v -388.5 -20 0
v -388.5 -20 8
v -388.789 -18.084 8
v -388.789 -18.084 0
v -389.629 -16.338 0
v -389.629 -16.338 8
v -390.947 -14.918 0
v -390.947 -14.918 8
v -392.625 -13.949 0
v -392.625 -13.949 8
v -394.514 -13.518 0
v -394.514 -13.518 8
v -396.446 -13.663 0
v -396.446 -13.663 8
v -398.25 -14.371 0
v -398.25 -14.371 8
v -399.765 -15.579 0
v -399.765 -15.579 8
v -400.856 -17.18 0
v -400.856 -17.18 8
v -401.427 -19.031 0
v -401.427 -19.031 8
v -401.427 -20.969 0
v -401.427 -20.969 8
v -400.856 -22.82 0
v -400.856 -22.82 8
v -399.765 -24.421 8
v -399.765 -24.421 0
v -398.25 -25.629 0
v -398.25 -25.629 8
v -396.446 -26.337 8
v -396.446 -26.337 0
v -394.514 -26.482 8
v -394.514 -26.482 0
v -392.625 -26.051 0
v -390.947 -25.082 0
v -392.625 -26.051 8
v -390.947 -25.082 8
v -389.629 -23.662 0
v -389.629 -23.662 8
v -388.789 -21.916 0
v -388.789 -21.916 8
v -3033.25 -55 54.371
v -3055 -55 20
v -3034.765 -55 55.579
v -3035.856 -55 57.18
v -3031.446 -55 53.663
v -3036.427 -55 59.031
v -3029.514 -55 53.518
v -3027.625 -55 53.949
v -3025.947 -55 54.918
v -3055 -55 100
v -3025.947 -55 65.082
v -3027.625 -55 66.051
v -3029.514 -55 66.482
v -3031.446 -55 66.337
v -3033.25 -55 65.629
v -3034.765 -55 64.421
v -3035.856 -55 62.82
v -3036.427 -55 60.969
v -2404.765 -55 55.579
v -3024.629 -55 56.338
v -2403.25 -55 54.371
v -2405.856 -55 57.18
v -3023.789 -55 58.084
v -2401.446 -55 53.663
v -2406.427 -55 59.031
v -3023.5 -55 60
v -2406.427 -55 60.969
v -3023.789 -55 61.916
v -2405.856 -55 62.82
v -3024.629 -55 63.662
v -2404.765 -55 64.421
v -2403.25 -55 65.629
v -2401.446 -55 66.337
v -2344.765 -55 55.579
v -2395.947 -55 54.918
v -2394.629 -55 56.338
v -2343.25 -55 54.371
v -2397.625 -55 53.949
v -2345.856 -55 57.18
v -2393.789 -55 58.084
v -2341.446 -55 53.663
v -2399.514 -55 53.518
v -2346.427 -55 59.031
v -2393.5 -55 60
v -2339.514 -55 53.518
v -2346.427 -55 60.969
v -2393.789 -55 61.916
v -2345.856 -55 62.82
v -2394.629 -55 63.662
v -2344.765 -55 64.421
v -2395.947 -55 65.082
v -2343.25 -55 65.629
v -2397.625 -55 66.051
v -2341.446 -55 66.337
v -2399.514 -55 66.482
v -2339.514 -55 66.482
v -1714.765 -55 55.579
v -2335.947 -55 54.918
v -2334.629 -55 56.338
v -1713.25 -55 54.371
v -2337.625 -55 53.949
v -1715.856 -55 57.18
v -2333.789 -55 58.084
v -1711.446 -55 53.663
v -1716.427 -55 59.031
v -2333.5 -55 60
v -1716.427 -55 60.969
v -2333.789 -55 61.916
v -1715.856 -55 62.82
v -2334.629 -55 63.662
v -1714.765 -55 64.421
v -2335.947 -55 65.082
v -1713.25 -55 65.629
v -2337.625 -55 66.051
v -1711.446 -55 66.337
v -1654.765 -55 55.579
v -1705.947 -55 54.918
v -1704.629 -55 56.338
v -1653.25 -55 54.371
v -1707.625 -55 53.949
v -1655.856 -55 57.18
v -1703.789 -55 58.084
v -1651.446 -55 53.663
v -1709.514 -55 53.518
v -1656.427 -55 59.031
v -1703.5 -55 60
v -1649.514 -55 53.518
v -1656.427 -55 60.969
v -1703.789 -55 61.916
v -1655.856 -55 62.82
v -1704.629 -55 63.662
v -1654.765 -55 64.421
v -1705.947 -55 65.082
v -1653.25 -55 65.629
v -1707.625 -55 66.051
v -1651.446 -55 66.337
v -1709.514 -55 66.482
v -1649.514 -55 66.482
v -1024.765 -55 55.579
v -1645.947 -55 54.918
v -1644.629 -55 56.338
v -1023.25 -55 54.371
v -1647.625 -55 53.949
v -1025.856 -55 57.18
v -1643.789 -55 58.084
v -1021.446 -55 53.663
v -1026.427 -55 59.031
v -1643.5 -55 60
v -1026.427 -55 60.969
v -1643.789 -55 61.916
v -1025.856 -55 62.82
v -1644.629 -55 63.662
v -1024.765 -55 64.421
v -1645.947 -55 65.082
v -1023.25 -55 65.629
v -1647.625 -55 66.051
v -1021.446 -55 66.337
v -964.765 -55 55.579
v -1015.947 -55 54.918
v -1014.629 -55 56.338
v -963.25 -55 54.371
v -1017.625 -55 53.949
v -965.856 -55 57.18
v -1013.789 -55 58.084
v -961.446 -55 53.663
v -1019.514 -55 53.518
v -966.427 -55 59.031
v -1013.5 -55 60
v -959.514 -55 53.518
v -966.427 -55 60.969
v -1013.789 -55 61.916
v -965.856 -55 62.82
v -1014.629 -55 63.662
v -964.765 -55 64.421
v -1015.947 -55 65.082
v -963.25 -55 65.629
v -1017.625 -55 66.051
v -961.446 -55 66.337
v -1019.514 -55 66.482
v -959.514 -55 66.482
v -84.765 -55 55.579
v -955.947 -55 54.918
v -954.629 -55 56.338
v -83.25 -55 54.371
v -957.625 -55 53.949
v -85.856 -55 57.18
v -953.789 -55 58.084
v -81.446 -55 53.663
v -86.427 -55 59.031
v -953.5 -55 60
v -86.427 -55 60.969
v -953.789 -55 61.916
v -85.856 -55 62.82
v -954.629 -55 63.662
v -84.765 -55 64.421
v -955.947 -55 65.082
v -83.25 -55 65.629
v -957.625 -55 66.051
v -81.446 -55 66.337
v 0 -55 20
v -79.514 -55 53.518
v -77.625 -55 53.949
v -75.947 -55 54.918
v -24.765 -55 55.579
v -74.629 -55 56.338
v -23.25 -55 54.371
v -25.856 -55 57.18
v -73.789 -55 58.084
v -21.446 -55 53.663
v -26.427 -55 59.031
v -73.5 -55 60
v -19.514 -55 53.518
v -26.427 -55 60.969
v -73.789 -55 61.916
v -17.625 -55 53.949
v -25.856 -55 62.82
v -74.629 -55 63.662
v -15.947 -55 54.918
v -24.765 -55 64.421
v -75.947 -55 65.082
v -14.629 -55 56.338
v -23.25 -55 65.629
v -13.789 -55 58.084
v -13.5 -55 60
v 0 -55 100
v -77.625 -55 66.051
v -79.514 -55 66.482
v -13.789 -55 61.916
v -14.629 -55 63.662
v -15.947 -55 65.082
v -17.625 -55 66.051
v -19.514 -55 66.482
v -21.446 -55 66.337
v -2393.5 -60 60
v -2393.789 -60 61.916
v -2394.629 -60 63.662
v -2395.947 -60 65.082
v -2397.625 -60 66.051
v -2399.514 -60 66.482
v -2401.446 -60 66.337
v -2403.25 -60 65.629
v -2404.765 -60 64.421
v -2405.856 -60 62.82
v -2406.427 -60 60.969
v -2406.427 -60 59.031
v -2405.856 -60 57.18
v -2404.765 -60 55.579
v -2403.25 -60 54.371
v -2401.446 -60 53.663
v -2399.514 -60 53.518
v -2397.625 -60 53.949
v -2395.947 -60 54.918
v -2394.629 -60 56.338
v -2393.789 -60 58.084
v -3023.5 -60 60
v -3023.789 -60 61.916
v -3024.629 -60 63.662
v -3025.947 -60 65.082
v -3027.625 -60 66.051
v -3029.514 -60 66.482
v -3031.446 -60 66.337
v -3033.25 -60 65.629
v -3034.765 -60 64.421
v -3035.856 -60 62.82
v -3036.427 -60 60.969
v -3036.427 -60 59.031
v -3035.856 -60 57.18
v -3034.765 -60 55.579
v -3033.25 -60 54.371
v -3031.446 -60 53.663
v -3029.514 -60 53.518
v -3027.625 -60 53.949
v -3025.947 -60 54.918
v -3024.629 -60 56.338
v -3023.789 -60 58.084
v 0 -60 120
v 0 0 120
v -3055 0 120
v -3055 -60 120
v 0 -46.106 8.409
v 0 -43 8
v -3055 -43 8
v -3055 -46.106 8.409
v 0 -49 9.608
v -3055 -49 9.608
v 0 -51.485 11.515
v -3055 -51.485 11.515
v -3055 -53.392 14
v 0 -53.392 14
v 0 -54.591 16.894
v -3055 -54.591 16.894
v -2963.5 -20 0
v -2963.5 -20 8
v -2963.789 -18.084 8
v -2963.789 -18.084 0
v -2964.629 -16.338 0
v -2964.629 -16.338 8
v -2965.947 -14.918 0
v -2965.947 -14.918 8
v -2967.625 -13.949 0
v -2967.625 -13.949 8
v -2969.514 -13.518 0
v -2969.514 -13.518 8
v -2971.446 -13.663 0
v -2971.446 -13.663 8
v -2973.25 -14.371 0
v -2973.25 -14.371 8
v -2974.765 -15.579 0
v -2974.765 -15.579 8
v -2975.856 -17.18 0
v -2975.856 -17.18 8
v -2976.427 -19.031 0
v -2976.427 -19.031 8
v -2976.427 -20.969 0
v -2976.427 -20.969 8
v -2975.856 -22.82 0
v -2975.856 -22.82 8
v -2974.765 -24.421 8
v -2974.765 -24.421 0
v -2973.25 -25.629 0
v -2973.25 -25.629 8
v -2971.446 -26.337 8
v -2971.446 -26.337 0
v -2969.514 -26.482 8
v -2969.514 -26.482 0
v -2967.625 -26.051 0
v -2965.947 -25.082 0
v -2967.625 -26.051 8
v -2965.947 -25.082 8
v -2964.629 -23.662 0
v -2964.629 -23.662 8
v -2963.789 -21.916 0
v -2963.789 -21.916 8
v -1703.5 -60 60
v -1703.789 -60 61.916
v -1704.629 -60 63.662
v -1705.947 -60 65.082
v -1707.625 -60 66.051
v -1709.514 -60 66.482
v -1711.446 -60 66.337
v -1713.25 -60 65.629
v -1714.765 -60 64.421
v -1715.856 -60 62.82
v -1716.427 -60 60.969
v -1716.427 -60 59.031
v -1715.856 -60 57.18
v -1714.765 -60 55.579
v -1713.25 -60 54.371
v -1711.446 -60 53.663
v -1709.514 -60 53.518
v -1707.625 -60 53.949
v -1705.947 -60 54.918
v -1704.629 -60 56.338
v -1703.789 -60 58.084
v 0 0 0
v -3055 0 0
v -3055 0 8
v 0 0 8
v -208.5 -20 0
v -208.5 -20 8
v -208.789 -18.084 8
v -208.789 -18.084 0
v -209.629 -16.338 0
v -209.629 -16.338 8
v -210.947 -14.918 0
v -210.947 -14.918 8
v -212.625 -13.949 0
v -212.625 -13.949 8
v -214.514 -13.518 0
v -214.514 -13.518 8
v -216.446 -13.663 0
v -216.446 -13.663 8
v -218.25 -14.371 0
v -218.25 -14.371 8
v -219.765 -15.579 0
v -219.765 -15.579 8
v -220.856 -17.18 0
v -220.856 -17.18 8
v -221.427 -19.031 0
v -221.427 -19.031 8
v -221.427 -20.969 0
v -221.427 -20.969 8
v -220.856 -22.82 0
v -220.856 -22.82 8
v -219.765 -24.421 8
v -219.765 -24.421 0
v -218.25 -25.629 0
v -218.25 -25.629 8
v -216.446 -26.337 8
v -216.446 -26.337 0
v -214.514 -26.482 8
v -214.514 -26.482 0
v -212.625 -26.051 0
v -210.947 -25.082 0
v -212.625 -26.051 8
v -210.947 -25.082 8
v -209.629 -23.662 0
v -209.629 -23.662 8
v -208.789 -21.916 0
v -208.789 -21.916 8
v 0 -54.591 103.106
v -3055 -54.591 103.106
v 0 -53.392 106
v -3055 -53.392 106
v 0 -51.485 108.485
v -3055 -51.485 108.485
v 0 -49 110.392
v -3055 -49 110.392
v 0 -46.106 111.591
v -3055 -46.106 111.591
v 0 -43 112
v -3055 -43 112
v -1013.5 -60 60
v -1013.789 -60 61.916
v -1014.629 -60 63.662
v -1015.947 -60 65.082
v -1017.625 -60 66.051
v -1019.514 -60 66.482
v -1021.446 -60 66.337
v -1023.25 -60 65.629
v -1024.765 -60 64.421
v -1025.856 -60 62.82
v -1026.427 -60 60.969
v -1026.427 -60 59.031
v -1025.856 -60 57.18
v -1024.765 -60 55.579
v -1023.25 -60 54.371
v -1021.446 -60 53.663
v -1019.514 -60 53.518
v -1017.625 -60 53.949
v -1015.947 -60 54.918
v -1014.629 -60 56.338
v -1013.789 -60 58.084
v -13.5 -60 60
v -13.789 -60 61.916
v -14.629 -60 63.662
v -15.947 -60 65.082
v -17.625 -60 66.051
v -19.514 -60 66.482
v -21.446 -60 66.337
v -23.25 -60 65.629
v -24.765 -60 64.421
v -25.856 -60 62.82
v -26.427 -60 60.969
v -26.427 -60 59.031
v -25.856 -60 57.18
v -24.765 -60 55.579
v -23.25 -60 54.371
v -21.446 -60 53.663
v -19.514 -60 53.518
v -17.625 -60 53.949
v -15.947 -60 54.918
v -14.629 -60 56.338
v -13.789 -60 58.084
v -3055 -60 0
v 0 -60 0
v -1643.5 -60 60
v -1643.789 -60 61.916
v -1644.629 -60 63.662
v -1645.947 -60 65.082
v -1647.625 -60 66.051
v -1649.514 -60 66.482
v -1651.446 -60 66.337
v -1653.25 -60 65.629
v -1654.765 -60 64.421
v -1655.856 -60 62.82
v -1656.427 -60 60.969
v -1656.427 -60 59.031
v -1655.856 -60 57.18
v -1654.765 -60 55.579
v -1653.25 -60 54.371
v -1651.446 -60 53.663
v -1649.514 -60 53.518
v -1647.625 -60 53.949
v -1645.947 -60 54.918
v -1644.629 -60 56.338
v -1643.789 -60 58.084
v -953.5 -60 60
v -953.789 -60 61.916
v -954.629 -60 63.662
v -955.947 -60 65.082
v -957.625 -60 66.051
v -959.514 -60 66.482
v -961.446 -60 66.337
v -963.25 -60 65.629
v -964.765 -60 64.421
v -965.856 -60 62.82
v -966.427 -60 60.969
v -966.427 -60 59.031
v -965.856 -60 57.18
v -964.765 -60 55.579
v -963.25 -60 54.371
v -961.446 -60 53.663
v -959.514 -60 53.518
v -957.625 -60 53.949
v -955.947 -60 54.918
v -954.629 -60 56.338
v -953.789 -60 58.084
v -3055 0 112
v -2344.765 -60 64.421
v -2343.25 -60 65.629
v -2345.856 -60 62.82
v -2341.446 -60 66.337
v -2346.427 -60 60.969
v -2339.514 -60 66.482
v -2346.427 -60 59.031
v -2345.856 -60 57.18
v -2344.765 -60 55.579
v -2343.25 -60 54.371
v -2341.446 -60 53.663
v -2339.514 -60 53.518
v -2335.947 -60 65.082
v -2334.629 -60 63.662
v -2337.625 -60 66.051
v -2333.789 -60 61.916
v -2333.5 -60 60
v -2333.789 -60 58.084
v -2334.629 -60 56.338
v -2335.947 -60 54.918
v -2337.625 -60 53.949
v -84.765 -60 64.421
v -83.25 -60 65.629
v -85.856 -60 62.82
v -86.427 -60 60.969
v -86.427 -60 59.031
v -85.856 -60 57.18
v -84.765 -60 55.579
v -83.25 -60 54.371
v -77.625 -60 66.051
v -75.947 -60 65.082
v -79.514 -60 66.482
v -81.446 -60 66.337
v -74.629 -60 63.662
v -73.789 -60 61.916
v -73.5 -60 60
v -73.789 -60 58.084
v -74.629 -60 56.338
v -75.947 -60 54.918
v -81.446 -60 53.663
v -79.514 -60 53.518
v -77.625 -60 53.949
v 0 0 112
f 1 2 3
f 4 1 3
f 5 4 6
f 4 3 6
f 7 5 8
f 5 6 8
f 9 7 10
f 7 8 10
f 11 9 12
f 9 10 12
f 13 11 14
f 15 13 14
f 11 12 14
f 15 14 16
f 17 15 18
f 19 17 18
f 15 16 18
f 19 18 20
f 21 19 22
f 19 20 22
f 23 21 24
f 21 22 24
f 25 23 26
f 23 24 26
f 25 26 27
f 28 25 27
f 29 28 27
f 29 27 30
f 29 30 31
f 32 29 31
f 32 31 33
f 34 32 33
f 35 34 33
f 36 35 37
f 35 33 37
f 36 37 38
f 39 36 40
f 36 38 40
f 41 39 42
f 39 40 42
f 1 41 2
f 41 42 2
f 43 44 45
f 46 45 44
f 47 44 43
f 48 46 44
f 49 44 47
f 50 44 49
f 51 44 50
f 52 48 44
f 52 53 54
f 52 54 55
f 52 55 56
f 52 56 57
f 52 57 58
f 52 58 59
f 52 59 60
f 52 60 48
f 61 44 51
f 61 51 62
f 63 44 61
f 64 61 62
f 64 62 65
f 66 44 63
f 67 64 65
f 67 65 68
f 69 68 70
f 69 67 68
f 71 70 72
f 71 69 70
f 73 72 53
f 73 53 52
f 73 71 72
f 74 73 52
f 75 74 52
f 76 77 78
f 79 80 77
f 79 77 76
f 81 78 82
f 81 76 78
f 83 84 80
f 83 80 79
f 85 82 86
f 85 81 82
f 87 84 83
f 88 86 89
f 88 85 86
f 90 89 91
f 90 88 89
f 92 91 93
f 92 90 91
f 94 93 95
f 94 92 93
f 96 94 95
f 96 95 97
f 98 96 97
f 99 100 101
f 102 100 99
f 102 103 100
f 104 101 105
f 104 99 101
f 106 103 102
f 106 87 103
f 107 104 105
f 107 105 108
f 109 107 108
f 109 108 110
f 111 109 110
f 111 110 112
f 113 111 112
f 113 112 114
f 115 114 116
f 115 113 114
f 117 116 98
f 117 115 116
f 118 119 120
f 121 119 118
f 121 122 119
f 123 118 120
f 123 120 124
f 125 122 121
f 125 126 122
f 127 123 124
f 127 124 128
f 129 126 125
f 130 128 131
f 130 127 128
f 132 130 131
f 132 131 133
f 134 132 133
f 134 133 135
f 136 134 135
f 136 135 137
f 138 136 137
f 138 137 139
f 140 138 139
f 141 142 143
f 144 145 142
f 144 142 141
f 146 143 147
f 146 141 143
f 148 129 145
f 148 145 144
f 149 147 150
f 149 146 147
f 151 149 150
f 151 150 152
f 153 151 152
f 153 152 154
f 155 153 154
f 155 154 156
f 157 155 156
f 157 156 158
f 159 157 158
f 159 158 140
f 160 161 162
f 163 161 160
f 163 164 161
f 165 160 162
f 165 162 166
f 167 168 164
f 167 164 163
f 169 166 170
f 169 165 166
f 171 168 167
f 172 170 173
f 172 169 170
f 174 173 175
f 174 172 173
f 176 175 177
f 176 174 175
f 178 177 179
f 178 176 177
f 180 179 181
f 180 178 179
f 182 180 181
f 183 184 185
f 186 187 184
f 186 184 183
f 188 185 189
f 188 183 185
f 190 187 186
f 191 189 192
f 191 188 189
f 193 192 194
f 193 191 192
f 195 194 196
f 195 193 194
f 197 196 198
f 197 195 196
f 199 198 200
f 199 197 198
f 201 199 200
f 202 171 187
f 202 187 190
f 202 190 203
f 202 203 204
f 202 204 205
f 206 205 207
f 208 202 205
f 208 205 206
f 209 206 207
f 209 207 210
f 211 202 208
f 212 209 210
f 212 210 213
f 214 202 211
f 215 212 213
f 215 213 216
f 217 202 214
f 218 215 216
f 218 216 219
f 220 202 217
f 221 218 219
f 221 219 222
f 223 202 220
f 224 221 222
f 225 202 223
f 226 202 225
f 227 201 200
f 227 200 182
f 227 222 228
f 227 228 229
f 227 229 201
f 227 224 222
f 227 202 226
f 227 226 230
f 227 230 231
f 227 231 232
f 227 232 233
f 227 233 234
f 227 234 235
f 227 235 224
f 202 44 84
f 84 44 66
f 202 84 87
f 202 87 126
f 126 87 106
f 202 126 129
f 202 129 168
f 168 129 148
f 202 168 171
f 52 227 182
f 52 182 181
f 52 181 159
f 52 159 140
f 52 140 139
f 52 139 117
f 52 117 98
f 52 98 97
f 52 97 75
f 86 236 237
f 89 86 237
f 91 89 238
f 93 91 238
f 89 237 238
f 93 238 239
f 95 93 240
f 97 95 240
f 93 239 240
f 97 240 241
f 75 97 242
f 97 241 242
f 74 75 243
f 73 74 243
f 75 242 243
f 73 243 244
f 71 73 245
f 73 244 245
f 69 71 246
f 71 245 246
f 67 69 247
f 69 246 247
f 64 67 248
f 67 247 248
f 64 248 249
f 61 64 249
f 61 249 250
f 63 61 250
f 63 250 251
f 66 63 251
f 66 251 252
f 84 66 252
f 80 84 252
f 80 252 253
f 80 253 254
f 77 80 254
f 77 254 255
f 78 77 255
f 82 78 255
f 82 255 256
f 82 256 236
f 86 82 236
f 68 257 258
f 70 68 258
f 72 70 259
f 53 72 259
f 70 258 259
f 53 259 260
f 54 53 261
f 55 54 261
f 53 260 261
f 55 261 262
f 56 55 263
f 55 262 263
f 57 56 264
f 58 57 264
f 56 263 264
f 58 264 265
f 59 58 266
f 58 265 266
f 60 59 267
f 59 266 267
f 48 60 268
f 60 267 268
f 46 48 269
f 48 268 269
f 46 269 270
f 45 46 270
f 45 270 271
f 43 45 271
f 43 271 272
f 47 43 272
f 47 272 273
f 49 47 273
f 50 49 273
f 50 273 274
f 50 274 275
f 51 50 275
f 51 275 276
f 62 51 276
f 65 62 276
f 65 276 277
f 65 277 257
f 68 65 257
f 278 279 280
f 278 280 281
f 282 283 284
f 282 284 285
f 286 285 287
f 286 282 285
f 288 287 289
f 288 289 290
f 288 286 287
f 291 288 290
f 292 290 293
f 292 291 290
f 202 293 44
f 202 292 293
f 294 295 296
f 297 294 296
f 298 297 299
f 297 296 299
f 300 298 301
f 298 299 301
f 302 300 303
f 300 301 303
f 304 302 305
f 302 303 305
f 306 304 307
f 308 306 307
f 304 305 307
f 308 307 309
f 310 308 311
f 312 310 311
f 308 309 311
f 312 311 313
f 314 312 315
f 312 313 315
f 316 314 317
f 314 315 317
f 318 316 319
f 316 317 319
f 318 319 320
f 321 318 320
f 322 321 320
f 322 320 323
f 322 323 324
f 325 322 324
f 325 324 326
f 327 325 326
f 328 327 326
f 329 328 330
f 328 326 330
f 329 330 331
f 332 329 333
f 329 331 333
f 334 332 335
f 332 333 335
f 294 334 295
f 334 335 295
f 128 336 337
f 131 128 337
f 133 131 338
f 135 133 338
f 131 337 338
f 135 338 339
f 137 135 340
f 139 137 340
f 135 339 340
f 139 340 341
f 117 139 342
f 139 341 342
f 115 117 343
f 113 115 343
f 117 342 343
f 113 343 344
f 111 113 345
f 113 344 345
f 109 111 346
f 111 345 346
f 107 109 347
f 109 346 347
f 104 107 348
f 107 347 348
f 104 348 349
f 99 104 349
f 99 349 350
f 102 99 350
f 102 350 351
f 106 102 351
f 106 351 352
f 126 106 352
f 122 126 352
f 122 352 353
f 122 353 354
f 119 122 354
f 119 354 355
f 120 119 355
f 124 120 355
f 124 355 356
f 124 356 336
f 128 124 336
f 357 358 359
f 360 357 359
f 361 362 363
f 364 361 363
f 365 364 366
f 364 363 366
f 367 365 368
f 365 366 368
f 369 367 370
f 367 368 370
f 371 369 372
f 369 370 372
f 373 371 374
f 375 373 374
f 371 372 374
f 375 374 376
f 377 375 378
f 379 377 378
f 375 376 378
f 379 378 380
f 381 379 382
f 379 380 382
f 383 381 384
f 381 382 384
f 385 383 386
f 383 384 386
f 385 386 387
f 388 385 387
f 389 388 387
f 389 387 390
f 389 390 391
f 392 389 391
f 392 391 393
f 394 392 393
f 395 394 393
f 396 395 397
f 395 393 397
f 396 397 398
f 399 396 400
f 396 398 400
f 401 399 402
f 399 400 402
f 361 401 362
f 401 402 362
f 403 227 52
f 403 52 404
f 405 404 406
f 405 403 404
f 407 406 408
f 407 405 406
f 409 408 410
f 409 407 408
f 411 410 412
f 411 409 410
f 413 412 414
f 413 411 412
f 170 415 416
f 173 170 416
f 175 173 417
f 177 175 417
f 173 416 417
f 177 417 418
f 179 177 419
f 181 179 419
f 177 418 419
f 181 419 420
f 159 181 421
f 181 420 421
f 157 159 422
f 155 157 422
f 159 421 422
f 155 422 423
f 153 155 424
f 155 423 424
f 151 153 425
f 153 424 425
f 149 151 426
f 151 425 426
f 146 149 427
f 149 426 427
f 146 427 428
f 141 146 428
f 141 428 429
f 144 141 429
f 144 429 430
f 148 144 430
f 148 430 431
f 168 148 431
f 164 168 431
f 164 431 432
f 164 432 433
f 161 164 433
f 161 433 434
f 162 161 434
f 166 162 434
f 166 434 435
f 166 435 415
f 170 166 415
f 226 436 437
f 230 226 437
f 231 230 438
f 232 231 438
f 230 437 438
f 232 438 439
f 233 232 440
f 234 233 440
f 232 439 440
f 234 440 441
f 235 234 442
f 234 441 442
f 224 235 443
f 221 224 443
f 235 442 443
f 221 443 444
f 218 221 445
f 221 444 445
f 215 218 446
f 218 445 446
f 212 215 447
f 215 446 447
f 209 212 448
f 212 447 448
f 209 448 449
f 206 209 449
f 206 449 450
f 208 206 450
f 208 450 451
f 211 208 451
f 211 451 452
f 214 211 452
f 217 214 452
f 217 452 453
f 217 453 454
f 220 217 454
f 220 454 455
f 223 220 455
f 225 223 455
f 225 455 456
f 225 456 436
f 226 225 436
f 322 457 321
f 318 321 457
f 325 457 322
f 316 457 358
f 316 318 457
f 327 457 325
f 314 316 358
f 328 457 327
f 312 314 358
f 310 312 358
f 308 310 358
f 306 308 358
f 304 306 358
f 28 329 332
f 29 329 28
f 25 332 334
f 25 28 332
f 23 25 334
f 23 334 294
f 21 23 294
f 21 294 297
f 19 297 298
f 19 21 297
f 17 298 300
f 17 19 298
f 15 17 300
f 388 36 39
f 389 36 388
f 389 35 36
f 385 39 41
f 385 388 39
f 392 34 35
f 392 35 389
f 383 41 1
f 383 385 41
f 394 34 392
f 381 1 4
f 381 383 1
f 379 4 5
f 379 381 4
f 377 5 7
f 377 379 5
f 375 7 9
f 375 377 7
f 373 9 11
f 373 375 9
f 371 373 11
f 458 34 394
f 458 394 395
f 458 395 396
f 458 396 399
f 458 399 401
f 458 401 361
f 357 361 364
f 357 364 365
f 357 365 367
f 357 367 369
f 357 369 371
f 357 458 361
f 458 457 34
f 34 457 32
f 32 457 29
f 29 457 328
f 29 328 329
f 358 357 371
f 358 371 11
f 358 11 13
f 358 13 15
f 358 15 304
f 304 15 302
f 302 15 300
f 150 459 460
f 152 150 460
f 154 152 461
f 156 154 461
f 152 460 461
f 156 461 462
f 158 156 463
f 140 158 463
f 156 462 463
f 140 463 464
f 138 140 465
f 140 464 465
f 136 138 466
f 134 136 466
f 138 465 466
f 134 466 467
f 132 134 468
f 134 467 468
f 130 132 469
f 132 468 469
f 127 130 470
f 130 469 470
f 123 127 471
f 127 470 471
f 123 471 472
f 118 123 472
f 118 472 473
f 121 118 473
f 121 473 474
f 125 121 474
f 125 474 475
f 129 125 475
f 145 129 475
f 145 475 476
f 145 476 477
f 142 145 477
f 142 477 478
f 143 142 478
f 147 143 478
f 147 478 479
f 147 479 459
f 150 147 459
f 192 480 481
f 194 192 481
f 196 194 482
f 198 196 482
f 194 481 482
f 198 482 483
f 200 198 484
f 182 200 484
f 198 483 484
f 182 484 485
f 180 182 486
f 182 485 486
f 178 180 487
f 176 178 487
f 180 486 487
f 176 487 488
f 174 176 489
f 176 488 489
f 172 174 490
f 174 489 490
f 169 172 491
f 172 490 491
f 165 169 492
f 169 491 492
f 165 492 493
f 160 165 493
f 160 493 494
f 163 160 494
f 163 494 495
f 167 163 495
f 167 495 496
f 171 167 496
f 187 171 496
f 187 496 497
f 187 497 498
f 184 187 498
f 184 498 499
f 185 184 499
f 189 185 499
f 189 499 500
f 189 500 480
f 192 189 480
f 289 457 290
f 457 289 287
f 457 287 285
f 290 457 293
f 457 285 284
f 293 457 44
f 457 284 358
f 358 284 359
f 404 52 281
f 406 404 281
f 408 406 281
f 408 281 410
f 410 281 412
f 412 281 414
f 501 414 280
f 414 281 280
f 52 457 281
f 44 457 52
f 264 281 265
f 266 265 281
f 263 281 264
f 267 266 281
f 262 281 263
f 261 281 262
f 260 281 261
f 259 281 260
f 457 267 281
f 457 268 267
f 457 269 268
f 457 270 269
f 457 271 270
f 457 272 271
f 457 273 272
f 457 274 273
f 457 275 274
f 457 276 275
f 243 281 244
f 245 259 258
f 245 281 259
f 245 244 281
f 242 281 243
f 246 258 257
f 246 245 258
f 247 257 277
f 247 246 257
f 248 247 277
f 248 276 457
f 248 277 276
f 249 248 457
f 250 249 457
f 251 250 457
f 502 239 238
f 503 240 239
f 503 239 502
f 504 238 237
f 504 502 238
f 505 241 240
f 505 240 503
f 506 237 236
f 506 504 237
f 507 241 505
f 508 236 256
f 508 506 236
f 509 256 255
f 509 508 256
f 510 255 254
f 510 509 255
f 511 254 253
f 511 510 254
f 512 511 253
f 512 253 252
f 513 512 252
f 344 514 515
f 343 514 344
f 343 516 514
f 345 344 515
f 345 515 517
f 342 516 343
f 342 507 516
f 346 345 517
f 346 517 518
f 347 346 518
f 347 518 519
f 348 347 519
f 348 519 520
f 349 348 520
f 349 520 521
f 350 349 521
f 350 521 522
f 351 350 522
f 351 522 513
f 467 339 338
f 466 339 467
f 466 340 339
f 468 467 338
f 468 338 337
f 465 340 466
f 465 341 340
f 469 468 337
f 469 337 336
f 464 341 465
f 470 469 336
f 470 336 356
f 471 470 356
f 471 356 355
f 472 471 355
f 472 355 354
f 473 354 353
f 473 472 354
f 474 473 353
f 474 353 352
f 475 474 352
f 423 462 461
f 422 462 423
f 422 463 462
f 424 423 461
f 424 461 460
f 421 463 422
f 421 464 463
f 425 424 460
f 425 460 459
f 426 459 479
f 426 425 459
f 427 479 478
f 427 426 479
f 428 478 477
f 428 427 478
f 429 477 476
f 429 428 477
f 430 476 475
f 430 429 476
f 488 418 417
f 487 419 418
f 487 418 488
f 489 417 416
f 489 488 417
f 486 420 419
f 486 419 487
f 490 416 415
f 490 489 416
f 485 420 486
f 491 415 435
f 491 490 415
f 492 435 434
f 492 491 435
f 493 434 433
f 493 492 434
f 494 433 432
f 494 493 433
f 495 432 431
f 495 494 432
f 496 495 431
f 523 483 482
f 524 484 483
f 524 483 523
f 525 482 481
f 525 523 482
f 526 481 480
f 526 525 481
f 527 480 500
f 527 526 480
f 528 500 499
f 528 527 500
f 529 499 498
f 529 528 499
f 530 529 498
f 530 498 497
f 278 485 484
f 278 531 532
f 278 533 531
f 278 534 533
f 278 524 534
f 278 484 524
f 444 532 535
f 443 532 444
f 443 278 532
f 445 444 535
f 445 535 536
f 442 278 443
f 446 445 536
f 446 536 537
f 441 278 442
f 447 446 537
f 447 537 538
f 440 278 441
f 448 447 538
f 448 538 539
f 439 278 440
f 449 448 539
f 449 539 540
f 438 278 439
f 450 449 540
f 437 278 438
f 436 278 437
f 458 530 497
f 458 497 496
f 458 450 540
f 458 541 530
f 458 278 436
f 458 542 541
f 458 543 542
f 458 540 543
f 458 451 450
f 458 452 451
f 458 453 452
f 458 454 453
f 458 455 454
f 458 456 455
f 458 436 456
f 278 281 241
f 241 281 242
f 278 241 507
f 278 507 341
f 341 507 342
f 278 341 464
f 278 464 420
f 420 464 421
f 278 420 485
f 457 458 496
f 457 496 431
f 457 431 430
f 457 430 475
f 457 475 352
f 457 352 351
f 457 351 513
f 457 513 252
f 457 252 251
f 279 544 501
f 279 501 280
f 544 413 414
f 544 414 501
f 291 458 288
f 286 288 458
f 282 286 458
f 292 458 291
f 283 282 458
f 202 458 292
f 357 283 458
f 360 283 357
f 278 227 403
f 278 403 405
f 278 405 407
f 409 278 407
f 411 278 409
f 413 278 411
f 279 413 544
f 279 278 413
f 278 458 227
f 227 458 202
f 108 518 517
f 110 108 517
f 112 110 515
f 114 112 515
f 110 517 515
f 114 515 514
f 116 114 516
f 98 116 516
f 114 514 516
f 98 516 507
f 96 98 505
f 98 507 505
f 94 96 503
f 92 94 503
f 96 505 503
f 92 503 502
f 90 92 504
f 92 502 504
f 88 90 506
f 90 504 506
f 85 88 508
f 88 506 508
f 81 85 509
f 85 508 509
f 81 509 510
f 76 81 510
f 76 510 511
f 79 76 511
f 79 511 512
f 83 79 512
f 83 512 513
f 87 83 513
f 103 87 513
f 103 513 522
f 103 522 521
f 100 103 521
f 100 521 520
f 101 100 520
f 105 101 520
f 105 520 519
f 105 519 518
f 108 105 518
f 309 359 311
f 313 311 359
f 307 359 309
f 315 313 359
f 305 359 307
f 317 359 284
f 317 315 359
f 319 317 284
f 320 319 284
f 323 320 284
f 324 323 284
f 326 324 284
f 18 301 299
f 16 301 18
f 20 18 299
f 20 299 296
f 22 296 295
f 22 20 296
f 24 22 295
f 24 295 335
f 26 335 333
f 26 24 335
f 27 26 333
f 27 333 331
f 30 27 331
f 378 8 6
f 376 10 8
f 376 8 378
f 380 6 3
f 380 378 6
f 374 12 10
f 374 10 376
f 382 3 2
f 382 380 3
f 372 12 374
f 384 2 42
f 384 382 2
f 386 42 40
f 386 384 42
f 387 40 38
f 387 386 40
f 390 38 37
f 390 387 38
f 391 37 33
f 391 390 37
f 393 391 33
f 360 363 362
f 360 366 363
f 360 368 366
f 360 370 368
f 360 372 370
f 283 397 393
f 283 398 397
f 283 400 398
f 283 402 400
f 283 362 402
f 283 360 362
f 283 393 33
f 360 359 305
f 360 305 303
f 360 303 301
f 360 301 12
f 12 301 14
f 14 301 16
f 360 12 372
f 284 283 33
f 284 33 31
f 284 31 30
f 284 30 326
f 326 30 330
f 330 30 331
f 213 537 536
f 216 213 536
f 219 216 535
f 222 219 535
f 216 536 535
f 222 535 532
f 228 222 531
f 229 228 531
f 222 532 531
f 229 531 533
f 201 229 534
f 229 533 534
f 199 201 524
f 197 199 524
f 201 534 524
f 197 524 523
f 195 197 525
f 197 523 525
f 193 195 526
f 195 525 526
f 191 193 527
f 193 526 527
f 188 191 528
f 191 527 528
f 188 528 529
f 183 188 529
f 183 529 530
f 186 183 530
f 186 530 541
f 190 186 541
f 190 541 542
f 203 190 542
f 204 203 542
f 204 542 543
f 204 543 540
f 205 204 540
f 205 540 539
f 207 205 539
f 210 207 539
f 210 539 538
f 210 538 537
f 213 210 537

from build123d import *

# Parameters (mm, degrees)
F3_DEPTH = 3055
F4_R     = 6.5
F5_DEPTH = 8
F6_R     = 6.5
F7_DEPTH = 60.001


with BuildPart() as f3:
    # F2 (on Right) → F3 (new body)
    with BuildSketch(Plane.YZ):
        with BuildLine():
            Line((-60, 0), (0, 0))
            Line((0, 0), (0, 8))
            Line((0, 8), (-43, 8))
            ThreePointArc((-43, 8), (-51.4852813742, 11.5147186258), (-55, 20))
            Line((-55, 20), (-55, 100))
            ThreePointArc((-55, 100), (-51.4852813742, 108.4852813742), (-43, 112))
            Line((-43, 112), (0, 112))
            Line((0, 112), (0, 120))
            Line((0, 120), (-60, 120))
            Line((-60, 120), (-60, 0))
        make_face()
    extrude(amount=-F3_DEPTH)

    # F4 (on face) → F5 (cut, through all)
    with BuildSketch(Plane.XY.offset(8)):
        with Locations((-215, -20)):
            Circle(F4_R)
        with Locations((-395, -20)):
            Circle(F4_R)
        with Locations((-2970, -20)):
            Circle(F4_R)
    extrude(amount=-F5_DEPTH, mode=Mode.SUBTRACT)

    # F6 (on face) → F7 (cut, through all)
    with BuildSketch(Plane.XZ.offset(60)):
        with Locations((-20, 60)):
            Circle(F6_R)
        with Locations((-80, 60)):
            Circle(F6_R)
        with Locations((-960, 60)):
            Circle(F6_R)
        with Locations((-1020, 60)):
            Circle(F6_R)
        with Locations((-1650, 60)):
            Circle(F6_R)
        with Locations((-1710, 60)):
            Circle(F6_R)
        with Locations((-2340, 60)):
            Circle(F6_R)
        with Locations((-2400, 60)):
            Circle(F6_R)
        with Locations((-3030, 60)):
            Circle(F6_R)
    extrude(amount=-F7_DEPTH, mode=Mode.SUBTRACT)


solid = f3.part
